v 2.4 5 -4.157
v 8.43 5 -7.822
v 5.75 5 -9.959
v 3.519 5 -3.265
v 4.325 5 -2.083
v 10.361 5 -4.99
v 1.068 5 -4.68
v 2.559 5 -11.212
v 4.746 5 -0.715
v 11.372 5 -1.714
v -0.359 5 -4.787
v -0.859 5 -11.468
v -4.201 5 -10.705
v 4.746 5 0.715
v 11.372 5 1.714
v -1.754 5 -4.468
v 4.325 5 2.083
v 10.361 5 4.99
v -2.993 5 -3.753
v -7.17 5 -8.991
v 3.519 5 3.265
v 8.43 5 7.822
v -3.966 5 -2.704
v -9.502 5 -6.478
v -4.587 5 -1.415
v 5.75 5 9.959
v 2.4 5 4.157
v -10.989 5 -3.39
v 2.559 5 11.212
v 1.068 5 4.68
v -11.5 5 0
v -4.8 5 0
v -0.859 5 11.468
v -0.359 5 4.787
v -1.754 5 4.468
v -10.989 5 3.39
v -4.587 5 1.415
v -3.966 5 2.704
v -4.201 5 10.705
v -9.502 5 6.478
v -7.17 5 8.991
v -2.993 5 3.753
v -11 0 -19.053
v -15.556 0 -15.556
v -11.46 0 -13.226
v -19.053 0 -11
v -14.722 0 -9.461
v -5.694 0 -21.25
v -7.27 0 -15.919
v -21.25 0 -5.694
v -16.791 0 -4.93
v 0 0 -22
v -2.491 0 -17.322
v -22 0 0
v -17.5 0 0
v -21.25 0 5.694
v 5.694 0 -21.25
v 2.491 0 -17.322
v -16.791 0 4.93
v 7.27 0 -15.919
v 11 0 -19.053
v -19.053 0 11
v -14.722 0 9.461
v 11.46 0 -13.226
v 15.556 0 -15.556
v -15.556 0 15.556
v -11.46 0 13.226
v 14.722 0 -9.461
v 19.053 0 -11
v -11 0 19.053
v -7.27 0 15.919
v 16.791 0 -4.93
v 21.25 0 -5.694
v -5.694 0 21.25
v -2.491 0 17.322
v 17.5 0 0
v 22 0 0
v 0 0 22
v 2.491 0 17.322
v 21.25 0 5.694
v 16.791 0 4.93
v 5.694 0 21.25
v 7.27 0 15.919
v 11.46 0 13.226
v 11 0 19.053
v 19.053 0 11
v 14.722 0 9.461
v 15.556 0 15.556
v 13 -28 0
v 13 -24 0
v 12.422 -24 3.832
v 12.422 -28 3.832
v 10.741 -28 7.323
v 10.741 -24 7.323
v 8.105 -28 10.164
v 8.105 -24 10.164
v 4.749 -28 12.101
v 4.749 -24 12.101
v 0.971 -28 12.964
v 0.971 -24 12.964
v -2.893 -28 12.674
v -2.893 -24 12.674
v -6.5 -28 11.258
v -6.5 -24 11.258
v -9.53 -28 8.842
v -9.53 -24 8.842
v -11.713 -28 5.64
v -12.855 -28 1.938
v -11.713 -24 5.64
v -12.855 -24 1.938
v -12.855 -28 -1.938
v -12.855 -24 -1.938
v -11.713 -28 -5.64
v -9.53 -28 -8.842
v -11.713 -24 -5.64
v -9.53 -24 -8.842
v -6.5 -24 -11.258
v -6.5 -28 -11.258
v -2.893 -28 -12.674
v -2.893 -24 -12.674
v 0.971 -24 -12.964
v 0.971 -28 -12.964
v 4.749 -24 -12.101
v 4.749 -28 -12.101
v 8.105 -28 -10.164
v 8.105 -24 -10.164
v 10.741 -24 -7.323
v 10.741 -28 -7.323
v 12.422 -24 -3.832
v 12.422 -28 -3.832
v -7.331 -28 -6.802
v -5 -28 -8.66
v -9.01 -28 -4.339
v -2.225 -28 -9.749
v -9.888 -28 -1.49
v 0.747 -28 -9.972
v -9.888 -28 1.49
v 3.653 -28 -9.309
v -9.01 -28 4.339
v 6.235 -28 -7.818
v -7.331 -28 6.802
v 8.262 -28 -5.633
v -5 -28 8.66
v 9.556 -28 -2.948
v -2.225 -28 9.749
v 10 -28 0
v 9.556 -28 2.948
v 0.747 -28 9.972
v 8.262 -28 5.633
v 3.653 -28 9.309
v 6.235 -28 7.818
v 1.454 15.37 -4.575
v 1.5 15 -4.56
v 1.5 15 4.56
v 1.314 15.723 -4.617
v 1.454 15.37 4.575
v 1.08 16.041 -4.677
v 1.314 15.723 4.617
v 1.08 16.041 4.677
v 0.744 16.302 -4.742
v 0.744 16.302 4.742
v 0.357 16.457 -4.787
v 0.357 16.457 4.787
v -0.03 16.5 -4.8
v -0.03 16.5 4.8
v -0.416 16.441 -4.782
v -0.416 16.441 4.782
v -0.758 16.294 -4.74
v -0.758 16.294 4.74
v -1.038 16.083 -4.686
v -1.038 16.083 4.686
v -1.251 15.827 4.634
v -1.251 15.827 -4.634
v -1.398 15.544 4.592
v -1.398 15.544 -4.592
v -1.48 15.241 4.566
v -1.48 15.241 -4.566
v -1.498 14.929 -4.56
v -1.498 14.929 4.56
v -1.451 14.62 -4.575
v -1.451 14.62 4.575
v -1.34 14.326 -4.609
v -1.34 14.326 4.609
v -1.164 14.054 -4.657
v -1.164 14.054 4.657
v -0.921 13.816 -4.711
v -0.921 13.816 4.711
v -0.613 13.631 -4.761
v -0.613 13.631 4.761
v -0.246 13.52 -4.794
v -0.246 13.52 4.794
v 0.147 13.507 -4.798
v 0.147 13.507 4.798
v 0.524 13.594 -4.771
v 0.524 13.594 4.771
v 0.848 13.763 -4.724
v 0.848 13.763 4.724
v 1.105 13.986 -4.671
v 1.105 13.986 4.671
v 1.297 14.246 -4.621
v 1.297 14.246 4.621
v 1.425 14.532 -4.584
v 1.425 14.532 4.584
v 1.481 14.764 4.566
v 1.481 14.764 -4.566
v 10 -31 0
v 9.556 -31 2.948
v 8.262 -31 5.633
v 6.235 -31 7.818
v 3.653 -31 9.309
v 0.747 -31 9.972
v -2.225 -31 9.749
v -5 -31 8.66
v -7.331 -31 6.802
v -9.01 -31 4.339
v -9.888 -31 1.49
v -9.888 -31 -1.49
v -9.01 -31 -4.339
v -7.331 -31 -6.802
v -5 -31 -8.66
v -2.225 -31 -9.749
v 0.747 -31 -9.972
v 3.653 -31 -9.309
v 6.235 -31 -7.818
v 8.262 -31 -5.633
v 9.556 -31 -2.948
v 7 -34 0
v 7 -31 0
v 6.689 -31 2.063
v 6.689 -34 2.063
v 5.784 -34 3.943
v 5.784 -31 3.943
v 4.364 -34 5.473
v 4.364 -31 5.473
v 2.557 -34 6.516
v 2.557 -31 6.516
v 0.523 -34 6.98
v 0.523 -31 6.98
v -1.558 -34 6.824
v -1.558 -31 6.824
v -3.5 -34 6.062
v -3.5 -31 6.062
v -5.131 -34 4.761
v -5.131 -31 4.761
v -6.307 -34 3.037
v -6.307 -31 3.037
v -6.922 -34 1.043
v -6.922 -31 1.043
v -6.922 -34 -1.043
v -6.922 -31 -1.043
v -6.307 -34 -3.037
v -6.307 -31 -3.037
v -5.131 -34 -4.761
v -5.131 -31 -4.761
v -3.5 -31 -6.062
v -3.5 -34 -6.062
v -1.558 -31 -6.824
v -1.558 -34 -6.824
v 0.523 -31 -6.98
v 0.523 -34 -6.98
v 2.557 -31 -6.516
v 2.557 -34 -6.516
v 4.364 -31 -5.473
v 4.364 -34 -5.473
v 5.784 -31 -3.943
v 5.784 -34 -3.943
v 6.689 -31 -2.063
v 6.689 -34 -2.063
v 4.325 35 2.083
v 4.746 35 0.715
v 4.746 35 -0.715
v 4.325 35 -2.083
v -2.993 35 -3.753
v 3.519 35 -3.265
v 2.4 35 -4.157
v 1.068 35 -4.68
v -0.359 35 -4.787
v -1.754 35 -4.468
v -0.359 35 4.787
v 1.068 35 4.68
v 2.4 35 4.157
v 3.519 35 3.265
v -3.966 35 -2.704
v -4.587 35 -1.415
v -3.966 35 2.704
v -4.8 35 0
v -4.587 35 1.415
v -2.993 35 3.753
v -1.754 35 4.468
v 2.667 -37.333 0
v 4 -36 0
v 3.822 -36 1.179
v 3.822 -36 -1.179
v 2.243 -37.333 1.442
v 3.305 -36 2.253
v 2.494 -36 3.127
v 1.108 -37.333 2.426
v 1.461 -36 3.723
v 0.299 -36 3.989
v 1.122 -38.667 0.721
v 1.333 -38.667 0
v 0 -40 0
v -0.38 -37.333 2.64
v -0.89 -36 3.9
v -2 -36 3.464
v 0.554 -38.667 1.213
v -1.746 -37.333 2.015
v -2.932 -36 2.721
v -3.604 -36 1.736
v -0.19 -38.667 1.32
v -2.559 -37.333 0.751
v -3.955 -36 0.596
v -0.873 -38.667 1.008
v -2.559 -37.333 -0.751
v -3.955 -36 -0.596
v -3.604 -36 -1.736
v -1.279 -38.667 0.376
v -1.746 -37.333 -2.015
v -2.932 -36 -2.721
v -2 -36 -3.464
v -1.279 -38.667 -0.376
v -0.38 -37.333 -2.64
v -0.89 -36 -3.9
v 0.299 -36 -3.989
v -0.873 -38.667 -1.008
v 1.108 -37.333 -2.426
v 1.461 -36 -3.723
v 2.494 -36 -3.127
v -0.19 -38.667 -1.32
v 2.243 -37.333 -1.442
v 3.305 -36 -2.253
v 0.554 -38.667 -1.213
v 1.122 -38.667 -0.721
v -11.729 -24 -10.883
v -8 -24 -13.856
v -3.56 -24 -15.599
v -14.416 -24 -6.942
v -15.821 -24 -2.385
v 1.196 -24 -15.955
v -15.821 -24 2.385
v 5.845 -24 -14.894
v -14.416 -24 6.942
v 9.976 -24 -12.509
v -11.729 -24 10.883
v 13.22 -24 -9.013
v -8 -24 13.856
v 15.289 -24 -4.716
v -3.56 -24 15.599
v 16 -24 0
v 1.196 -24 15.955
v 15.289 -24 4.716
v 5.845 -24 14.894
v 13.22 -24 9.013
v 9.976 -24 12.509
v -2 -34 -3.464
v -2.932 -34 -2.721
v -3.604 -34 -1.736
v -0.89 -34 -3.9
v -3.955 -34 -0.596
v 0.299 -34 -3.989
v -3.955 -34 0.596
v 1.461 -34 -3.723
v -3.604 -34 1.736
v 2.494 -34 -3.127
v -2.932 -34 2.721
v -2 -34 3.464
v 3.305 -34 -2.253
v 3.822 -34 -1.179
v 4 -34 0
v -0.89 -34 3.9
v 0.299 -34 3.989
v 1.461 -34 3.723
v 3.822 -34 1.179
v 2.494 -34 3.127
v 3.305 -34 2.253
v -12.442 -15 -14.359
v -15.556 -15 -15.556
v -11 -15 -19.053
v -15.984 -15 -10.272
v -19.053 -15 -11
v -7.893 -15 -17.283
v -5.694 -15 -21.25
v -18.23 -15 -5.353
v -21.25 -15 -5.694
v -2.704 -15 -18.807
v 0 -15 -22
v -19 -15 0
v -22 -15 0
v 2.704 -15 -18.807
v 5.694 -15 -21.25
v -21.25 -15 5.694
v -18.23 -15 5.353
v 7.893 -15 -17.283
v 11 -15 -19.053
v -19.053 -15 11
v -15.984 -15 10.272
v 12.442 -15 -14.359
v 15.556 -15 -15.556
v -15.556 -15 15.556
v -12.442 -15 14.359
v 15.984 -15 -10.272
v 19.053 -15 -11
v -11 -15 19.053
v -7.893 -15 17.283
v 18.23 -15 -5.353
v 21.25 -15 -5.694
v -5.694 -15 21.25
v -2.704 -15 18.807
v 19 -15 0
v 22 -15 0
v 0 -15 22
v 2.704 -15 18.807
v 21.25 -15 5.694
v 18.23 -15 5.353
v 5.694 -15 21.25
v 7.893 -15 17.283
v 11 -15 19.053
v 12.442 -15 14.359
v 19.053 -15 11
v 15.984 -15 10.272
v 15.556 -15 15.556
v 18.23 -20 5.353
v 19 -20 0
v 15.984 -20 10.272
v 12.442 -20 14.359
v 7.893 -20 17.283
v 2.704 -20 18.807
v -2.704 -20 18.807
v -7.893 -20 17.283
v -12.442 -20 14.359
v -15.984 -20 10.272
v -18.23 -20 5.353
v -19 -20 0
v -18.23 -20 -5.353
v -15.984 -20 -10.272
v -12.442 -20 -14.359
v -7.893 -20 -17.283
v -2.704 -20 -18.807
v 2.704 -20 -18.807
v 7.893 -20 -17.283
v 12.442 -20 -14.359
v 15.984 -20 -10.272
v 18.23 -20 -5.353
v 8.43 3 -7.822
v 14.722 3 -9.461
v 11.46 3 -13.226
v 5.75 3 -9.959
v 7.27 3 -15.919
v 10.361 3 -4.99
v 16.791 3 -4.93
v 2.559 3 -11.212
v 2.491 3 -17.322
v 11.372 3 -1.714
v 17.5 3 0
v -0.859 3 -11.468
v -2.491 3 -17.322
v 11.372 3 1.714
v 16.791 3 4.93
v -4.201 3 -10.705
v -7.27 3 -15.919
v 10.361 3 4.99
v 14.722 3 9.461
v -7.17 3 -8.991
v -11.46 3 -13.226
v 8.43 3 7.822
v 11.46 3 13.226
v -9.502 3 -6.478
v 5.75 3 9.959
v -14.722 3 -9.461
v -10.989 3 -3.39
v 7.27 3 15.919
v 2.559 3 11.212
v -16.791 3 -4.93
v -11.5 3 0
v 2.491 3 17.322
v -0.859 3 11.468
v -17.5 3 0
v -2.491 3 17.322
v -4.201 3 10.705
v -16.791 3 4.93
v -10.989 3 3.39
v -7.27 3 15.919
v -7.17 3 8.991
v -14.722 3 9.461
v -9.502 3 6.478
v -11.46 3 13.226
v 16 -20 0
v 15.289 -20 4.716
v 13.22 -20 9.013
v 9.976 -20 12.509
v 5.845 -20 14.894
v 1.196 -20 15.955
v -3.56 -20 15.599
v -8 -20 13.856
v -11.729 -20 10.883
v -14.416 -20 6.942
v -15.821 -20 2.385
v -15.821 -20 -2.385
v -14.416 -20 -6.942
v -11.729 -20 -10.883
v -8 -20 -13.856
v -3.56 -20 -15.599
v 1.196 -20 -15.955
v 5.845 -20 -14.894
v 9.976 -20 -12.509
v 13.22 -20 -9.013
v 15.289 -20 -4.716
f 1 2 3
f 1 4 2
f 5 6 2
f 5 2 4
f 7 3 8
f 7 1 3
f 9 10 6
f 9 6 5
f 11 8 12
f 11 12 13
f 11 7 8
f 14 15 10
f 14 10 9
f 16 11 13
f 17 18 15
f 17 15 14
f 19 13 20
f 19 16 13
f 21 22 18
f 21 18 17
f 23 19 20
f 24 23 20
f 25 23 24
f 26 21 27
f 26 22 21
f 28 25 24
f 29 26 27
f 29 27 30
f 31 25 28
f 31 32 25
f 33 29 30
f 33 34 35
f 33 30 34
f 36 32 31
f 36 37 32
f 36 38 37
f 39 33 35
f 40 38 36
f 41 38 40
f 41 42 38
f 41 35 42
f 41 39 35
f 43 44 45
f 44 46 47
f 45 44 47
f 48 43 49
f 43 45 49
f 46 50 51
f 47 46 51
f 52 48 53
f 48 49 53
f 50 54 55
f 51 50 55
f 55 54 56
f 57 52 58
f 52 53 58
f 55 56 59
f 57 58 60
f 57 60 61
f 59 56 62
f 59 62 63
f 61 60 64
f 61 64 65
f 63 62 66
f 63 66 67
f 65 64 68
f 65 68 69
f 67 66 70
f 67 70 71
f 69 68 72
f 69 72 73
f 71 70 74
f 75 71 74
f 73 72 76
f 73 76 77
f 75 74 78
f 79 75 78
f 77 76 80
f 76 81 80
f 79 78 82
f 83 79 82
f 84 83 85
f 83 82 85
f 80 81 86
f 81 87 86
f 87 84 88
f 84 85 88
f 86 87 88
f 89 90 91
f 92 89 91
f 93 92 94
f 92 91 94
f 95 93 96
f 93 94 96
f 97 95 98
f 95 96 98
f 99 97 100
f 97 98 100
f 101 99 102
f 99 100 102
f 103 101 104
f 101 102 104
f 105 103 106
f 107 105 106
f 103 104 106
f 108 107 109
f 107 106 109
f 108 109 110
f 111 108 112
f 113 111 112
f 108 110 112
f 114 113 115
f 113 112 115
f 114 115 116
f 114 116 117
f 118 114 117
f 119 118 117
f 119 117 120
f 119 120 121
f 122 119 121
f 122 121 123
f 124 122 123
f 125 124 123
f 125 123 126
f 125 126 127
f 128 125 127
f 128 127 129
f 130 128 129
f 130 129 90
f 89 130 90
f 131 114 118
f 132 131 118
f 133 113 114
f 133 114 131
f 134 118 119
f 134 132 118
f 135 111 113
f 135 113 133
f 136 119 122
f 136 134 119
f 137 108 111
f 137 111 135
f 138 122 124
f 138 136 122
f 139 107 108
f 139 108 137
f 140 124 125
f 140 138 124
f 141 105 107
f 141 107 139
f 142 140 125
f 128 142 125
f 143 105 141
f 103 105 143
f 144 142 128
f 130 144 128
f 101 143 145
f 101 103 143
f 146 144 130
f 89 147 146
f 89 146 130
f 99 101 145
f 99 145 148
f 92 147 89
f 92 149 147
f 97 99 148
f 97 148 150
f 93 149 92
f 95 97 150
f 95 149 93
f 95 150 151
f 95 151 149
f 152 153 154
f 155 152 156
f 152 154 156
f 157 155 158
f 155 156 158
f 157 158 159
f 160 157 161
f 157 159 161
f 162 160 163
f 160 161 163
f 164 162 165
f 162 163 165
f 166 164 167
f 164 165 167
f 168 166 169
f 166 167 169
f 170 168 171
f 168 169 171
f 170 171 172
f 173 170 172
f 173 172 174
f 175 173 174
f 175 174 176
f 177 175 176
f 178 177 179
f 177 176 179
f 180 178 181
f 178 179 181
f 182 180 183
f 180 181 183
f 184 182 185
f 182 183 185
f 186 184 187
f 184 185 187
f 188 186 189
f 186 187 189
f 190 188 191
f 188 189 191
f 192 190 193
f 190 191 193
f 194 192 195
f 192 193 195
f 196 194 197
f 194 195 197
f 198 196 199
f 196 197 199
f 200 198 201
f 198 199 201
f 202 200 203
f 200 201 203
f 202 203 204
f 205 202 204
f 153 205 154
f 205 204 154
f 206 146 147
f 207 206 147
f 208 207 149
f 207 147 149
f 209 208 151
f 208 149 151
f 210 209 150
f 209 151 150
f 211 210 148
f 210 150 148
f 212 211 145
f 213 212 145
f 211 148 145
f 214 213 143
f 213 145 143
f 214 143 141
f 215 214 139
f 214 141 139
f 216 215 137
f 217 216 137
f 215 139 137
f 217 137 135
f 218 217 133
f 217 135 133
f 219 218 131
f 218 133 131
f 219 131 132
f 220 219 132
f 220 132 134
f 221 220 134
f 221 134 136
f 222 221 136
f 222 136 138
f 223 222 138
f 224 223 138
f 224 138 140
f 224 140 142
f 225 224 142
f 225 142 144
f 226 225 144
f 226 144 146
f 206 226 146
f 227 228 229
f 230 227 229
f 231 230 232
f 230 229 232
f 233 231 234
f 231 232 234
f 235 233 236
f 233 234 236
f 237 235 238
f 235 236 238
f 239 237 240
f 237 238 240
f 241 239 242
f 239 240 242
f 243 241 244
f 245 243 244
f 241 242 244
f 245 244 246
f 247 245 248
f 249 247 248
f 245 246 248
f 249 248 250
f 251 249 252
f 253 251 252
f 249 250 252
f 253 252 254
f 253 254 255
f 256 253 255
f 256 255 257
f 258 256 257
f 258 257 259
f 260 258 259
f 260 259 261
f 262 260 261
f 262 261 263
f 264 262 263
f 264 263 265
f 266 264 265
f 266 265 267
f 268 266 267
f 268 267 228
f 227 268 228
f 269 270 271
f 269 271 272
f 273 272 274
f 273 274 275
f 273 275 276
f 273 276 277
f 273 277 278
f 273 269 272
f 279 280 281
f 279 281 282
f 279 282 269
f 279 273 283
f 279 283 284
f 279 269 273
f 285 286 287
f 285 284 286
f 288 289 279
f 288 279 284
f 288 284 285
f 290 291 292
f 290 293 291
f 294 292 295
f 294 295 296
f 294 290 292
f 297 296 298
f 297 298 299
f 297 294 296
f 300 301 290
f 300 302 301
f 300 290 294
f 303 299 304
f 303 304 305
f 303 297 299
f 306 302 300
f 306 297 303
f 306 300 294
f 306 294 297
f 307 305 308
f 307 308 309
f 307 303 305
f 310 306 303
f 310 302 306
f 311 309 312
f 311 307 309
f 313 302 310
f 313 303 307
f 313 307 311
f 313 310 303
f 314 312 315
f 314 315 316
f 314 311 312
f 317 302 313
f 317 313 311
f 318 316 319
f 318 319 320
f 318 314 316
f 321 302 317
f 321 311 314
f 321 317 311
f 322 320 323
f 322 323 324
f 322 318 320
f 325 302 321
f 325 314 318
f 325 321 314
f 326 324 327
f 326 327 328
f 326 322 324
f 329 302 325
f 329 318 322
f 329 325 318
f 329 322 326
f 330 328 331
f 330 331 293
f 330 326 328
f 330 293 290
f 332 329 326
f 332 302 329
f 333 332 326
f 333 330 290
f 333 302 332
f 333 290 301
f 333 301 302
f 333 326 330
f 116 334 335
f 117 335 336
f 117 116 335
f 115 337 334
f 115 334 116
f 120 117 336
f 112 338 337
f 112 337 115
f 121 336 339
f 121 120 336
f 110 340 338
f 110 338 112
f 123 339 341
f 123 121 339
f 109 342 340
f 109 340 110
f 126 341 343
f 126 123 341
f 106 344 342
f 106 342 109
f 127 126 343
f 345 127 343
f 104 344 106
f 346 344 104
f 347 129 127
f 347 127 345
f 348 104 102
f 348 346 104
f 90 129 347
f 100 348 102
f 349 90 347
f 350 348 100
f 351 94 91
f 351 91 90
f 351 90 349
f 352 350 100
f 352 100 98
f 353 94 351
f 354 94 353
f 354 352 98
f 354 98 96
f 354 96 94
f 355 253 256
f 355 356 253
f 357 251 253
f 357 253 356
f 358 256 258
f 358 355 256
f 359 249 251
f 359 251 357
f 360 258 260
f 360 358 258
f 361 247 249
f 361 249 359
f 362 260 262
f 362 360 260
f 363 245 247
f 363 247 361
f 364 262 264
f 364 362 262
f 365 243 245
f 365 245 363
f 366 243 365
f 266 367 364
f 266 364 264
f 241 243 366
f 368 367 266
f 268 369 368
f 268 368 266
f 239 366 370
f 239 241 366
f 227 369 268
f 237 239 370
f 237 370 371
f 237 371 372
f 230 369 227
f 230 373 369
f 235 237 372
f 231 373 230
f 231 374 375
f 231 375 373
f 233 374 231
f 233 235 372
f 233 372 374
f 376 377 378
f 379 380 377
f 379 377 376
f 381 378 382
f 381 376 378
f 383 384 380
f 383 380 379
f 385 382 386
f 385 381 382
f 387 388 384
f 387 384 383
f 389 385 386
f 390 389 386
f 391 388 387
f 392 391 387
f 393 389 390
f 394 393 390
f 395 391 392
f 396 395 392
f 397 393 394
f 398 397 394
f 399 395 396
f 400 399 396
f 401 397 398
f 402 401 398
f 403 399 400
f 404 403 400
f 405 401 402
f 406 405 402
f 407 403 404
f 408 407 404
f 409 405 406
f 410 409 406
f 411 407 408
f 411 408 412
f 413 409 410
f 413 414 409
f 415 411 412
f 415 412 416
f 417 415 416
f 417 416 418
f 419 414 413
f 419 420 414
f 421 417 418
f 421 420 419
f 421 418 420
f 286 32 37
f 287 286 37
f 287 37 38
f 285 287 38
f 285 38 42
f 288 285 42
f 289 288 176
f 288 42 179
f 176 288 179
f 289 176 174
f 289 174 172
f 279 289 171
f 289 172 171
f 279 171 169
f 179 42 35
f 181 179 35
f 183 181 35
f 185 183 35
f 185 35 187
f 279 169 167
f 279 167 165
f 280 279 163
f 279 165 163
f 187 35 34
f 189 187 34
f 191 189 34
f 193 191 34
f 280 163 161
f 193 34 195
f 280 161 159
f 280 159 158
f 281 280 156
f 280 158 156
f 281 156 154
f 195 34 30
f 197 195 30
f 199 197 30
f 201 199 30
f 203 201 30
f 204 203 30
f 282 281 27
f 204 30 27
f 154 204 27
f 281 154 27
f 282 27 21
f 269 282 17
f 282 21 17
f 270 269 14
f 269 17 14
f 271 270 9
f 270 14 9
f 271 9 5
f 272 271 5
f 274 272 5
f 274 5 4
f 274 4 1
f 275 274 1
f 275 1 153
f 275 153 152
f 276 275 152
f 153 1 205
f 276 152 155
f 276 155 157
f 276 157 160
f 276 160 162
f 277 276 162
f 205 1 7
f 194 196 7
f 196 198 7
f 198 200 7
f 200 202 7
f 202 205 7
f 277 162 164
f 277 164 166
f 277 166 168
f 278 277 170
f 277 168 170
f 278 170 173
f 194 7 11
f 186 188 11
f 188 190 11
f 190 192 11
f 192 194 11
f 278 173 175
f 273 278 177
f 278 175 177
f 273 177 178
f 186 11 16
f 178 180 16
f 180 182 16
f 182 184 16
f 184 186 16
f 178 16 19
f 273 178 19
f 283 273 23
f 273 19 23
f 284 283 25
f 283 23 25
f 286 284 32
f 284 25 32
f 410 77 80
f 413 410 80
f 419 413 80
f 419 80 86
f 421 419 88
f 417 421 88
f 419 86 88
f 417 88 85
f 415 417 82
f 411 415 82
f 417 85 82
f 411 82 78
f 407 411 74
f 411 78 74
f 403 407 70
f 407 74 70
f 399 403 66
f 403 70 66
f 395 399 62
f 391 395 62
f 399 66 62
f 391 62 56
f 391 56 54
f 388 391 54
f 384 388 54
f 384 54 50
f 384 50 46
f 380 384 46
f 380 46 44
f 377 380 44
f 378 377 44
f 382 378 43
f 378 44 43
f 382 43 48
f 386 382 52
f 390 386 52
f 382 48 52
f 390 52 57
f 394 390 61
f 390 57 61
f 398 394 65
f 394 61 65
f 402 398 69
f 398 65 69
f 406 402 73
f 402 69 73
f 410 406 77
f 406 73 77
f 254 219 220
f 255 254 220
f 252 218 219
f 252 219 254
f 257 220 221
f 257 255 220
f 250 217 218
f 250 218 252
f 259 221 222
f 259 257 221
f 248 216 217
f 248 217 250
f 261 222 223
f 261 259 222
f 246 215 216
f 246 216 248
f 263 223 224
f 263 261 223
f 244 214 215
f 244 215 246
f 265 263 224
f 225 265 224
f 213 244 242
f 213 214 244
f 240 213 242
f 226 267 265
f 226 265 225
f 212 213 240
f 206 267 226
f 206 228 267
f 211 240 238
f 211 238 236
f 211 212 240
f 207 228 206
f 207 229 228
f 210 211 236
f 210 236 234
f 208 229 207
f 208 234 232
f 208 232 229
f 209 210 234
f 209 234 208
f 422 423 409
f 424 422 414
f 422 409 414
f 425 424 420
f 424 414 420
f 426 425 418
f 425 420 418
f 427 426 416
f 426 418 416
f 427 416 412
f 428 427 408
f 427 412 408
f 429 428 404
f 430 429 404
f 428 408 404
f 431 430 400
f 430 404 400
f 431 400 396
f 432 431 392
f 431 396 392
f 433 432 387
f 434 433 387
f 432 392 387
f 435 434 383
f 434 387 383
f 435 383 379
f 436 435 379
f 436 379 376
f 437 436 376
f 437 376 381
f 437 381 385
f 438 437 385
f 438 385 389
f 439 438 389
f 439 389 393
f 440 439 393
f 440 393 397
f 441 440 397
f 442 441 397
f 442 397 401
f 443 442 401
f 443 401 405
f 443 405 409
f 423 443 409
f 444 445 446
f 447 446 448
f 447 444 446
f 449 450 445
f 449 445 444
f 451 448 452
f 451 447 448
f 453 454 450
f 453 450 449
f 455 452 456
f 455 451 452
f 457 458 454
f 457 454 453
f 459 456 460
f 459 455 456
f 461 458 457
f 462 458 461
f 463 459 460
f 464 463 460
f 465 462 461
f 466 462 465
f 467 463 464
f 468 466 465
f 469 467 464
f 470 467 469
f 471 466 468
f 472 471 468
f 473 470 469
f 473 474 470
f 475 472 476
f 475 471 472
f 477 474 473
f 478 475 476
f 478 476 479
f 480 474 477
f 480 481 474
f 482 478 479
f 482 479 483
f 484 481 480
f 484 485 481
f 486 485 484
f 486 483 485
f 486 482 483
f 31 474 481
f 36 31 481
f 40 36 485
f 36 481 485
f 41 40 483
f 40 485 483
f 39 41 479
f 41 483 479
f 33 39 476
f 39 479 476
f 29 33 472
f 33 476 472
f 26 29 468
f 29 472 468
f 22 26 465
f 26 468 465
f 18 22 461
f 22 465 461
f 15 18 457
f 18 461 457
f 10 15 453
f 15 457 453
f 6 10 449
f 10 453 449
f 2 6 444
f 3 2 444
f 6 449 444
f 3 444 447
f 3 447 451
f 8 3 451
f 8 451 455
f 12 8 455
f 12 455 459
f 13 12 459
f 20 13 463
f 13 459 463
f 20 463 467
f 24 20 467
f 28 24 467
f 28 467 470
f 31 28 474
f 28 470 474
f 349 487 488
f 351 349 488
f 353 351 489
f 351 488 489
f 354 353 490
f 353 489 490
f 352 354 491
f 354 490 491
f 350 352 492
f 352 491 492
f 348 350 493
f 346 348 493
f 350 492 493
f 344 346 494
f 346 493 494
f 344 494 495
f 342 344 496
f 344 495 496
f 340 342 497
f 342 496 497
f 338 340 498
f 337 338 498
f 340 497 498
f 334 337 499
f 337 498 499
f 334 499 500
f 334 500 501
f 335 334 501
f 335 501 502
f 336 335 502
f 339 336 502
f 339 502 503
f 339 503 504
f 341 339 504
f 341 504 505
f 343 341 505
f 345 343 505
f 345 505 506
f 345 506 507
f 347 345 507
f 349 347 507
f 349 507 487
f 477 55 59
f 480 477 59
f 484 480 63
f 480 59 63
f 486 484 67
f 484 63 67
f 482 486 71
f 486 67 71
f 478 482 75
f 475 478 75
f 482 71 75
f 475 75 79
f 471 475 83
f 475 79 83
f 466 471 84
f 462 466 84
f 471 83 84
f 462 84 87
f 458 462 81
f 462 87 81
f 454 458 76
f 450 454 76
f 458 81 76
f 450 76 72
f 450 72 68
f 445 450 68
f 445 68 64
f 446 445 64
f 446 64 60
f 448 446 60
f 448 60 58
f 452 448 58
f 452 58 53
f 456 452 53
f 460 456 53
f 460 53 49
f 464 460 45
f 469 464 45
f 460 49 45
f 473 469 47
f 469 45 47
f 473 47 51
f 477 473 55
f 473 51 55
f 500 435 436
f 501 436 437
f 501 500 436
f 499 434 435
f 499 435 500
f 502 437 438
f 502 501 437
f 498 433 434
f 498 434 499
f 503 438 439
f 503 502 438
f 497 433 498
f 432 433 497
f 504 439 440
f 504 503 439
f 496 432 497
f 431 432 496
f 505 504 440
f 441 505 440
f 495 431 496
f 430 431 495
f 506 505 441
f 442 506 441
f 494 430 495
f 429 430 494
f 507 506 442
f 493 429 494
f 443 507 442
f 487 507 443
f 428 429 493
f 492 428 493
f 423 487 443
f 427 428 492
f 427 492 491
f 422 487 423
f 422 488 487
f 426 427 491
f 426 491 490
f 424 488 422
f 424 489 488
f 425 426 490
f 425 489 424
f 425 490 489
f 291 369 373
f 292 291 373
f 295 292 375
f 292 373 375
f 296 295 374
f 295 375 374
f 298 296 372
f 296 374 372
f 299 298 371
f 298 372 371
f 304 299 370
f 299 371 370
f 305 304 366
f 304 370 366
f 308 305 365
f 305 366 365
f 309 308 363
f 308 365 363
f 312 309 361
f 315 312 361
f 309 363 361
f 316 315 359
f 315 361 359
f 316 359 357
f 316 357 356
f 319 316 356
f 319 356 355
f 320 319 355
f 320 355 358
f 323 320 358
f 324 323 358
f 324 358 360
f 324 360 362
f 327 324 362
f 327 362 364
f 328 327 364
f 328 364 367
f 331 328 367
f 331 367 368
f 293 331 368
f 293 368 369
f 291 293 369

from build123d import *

# Parameters (mm, degrees)
F0_R      = 22
F0_R_2    = 19
F0_R_3    = 16
F0_R_4    = 13
F0_R_5    = 10
F0_R_6    = 7
F0_R_7    = 4
F1_DEPTH  = 15
F2_DEPTH  = 20
F3_DEPTH  = 24
F4_DEPTH  = 28
F5_DEPTH  = 31
F6_DEPTH  = 34
F7_DEPTH  = 40
F8_SIZE   = 4
F9_R      = 17.5
F10_DEPTH = 3
F11_R     = 11.5
F12_DEPTH = 2
F13_R     = 4.8
F14_DEPTH = 30
F15_R     = 1.5
F16_DEPTH = 12.5


# Not quite as in the source:
# - a feature names something its author has since deleted; it is built from what else it names


with BuildPart() as f1:
    # F0 (on Front) → F1 (new body)
    with BuildSketch(Plane.XZ):
        Circle(F0_R)
        Circle(F0_R_2, mode=Mode.SUBTRACT)
        Circle(F0_R_2)
        Circle(F0_R_3, mode=Mode.SUBTRACT)
        Circle(F0_R_3)
        Circle(F0_R_4, mode=Mode.SUBTRACT)
        Circle(F0_R_4)
        Circle(F0_R_5, mode=Mode.SUBTRACT)
        Circle(F0_R_5)
        Circle(F0_R_6, mode=Mode.SUBTRACT)
        Circle(F0_R_6)
        Circle(F0_R_7, mode=Mode.SUBTRACT)
        Circle(F0_R_7)
    extrude(amount=F1_DEPTH)

    # F0 (on Front) → F2 (join)
    with BuildSketch(Plane.XZ):
        Circle(F0_R_2)
        Circle(F0_R_3, mode=Mode.SUBTRACT)
        Circle(F0_R_3)
        Circle(F0_R_4, mode=Mode.SUBTRACT)
        Circle(F0_R_4)
        Circle(F0_R_5, mode=Mode.SUBTRACT)
        Circle(F0_R_5)
        Circle(F0_R_6, mode=Mode.SUBTRACT)
        Circle(F0_R_6)
        Circle(F0_R_7, mode=Mode.SUBTRACT)
        Circle(F0_R_7)
    extrude(amount=F2_DEPTH)

    # F0 (on Front) → F3 (join)
    with BuildSketch(Plane.XZ):
        Circle(F0_R_3)
        Circle(F0_R_4, mode=Mode.SUBTRACT)
        Circle(F0_R_4)
        Circle(F0_R_5, mode=Mode.SUBTRACT)
        Circle(F0_R_5)
        Circle(F0_R_6, mode=Mode.SUBTRACT)
        Circle(F0_R_6)
        Circle(F0_R_7, mode=Mode.SUBTRACT)
        Circle(F0_R_7)
    extrude(amount=F3_DEPTH)

    # F0 (on Front) → F4 (join)
    with BuildSketch(Plane.XZ):
        Circle(F0_R_4)
        Circle(F0_R_5, mode=Mode.SUBTRACT)
        Circle(F0_R_5)
        Circle(F0_R_6, mode=Mode.SUBTRACT)
        Circle(F0_R_6)
        Circle(F0_R_7, mode=Mode.SUBTRACT)
        Circle(F0_R_7)
    extrude(amount=F4_DEPTH)

    # F0 (on Front) → F5 (join)
    with BuildSketch(Plane.XZ):
        Circle(F0_R_5)
        Circle(F0_R_6, mode=Mode.SUBTRACT)
        Circle(F0_R_6)
        Circle(F0_R_7, mode=Mode.SUBTRACT)
        Circle(F0_R_7)
    extrude(amount=F5_DEPTH)

    # F0 (on Front) → F6 (join)
    with BuildSketch(Plane.XZ):
        Circle(F0_R_6)
        Circle(F0_R_7, mode=Mode.SUBTRACT)
        Circle(F0_R_7)
    extrude(amount=F6_DEPTH)

    # F0 (on Front) → F7 (join)
    with BuildSketch(Plane.XZ):
        Circle(F0_R_7)
    extrude(amount=F7_DEPTH)

    # F8
    f8_edges = [f1.edges().sort_by_distance(p)[0] for p in [
        (-4, -40, 0),
    ]]
    chamfer(f8_edges, length=F8_SIZE)

    # F9 (on face) → F10 (join)
    with BuildSketch(Plane(origin=(0, 0, 0), x_dir=(-1, 0, 0), z_dir=(0, 1, 0))):
        Circle(F9_R)
    extrude(amount=F10_DEPTH)

    # F11 (on face) → F12 (join)
    with BuildSketch(Plane(origin=(0, 3, 0), x_dir=(-1, 0, 0), z_dir=(0, 1, 0))):
        Circle(F11_R)
    extrude(amount=F12_DEPTH)

    # F13 (on face) → F14 (join)
    with BuildSketch(Plane(origin=(0, 5, 0), x_dir=(-1, 0, 0), z_dir=(0, 1, 0))):
        Circle(F13_R)
    extrude(amount=F14_DEPTH)

    # F15 (on Top) → F16 (cut, symmetric)
    with BuildSketch(Plane.XY):
        with Locations((0, 15)):
            Circle(F15_R)
    extrude(amount=F16_DEPTH, both=True, mode=Mode.SUBTRACT)


solid = f1.part
